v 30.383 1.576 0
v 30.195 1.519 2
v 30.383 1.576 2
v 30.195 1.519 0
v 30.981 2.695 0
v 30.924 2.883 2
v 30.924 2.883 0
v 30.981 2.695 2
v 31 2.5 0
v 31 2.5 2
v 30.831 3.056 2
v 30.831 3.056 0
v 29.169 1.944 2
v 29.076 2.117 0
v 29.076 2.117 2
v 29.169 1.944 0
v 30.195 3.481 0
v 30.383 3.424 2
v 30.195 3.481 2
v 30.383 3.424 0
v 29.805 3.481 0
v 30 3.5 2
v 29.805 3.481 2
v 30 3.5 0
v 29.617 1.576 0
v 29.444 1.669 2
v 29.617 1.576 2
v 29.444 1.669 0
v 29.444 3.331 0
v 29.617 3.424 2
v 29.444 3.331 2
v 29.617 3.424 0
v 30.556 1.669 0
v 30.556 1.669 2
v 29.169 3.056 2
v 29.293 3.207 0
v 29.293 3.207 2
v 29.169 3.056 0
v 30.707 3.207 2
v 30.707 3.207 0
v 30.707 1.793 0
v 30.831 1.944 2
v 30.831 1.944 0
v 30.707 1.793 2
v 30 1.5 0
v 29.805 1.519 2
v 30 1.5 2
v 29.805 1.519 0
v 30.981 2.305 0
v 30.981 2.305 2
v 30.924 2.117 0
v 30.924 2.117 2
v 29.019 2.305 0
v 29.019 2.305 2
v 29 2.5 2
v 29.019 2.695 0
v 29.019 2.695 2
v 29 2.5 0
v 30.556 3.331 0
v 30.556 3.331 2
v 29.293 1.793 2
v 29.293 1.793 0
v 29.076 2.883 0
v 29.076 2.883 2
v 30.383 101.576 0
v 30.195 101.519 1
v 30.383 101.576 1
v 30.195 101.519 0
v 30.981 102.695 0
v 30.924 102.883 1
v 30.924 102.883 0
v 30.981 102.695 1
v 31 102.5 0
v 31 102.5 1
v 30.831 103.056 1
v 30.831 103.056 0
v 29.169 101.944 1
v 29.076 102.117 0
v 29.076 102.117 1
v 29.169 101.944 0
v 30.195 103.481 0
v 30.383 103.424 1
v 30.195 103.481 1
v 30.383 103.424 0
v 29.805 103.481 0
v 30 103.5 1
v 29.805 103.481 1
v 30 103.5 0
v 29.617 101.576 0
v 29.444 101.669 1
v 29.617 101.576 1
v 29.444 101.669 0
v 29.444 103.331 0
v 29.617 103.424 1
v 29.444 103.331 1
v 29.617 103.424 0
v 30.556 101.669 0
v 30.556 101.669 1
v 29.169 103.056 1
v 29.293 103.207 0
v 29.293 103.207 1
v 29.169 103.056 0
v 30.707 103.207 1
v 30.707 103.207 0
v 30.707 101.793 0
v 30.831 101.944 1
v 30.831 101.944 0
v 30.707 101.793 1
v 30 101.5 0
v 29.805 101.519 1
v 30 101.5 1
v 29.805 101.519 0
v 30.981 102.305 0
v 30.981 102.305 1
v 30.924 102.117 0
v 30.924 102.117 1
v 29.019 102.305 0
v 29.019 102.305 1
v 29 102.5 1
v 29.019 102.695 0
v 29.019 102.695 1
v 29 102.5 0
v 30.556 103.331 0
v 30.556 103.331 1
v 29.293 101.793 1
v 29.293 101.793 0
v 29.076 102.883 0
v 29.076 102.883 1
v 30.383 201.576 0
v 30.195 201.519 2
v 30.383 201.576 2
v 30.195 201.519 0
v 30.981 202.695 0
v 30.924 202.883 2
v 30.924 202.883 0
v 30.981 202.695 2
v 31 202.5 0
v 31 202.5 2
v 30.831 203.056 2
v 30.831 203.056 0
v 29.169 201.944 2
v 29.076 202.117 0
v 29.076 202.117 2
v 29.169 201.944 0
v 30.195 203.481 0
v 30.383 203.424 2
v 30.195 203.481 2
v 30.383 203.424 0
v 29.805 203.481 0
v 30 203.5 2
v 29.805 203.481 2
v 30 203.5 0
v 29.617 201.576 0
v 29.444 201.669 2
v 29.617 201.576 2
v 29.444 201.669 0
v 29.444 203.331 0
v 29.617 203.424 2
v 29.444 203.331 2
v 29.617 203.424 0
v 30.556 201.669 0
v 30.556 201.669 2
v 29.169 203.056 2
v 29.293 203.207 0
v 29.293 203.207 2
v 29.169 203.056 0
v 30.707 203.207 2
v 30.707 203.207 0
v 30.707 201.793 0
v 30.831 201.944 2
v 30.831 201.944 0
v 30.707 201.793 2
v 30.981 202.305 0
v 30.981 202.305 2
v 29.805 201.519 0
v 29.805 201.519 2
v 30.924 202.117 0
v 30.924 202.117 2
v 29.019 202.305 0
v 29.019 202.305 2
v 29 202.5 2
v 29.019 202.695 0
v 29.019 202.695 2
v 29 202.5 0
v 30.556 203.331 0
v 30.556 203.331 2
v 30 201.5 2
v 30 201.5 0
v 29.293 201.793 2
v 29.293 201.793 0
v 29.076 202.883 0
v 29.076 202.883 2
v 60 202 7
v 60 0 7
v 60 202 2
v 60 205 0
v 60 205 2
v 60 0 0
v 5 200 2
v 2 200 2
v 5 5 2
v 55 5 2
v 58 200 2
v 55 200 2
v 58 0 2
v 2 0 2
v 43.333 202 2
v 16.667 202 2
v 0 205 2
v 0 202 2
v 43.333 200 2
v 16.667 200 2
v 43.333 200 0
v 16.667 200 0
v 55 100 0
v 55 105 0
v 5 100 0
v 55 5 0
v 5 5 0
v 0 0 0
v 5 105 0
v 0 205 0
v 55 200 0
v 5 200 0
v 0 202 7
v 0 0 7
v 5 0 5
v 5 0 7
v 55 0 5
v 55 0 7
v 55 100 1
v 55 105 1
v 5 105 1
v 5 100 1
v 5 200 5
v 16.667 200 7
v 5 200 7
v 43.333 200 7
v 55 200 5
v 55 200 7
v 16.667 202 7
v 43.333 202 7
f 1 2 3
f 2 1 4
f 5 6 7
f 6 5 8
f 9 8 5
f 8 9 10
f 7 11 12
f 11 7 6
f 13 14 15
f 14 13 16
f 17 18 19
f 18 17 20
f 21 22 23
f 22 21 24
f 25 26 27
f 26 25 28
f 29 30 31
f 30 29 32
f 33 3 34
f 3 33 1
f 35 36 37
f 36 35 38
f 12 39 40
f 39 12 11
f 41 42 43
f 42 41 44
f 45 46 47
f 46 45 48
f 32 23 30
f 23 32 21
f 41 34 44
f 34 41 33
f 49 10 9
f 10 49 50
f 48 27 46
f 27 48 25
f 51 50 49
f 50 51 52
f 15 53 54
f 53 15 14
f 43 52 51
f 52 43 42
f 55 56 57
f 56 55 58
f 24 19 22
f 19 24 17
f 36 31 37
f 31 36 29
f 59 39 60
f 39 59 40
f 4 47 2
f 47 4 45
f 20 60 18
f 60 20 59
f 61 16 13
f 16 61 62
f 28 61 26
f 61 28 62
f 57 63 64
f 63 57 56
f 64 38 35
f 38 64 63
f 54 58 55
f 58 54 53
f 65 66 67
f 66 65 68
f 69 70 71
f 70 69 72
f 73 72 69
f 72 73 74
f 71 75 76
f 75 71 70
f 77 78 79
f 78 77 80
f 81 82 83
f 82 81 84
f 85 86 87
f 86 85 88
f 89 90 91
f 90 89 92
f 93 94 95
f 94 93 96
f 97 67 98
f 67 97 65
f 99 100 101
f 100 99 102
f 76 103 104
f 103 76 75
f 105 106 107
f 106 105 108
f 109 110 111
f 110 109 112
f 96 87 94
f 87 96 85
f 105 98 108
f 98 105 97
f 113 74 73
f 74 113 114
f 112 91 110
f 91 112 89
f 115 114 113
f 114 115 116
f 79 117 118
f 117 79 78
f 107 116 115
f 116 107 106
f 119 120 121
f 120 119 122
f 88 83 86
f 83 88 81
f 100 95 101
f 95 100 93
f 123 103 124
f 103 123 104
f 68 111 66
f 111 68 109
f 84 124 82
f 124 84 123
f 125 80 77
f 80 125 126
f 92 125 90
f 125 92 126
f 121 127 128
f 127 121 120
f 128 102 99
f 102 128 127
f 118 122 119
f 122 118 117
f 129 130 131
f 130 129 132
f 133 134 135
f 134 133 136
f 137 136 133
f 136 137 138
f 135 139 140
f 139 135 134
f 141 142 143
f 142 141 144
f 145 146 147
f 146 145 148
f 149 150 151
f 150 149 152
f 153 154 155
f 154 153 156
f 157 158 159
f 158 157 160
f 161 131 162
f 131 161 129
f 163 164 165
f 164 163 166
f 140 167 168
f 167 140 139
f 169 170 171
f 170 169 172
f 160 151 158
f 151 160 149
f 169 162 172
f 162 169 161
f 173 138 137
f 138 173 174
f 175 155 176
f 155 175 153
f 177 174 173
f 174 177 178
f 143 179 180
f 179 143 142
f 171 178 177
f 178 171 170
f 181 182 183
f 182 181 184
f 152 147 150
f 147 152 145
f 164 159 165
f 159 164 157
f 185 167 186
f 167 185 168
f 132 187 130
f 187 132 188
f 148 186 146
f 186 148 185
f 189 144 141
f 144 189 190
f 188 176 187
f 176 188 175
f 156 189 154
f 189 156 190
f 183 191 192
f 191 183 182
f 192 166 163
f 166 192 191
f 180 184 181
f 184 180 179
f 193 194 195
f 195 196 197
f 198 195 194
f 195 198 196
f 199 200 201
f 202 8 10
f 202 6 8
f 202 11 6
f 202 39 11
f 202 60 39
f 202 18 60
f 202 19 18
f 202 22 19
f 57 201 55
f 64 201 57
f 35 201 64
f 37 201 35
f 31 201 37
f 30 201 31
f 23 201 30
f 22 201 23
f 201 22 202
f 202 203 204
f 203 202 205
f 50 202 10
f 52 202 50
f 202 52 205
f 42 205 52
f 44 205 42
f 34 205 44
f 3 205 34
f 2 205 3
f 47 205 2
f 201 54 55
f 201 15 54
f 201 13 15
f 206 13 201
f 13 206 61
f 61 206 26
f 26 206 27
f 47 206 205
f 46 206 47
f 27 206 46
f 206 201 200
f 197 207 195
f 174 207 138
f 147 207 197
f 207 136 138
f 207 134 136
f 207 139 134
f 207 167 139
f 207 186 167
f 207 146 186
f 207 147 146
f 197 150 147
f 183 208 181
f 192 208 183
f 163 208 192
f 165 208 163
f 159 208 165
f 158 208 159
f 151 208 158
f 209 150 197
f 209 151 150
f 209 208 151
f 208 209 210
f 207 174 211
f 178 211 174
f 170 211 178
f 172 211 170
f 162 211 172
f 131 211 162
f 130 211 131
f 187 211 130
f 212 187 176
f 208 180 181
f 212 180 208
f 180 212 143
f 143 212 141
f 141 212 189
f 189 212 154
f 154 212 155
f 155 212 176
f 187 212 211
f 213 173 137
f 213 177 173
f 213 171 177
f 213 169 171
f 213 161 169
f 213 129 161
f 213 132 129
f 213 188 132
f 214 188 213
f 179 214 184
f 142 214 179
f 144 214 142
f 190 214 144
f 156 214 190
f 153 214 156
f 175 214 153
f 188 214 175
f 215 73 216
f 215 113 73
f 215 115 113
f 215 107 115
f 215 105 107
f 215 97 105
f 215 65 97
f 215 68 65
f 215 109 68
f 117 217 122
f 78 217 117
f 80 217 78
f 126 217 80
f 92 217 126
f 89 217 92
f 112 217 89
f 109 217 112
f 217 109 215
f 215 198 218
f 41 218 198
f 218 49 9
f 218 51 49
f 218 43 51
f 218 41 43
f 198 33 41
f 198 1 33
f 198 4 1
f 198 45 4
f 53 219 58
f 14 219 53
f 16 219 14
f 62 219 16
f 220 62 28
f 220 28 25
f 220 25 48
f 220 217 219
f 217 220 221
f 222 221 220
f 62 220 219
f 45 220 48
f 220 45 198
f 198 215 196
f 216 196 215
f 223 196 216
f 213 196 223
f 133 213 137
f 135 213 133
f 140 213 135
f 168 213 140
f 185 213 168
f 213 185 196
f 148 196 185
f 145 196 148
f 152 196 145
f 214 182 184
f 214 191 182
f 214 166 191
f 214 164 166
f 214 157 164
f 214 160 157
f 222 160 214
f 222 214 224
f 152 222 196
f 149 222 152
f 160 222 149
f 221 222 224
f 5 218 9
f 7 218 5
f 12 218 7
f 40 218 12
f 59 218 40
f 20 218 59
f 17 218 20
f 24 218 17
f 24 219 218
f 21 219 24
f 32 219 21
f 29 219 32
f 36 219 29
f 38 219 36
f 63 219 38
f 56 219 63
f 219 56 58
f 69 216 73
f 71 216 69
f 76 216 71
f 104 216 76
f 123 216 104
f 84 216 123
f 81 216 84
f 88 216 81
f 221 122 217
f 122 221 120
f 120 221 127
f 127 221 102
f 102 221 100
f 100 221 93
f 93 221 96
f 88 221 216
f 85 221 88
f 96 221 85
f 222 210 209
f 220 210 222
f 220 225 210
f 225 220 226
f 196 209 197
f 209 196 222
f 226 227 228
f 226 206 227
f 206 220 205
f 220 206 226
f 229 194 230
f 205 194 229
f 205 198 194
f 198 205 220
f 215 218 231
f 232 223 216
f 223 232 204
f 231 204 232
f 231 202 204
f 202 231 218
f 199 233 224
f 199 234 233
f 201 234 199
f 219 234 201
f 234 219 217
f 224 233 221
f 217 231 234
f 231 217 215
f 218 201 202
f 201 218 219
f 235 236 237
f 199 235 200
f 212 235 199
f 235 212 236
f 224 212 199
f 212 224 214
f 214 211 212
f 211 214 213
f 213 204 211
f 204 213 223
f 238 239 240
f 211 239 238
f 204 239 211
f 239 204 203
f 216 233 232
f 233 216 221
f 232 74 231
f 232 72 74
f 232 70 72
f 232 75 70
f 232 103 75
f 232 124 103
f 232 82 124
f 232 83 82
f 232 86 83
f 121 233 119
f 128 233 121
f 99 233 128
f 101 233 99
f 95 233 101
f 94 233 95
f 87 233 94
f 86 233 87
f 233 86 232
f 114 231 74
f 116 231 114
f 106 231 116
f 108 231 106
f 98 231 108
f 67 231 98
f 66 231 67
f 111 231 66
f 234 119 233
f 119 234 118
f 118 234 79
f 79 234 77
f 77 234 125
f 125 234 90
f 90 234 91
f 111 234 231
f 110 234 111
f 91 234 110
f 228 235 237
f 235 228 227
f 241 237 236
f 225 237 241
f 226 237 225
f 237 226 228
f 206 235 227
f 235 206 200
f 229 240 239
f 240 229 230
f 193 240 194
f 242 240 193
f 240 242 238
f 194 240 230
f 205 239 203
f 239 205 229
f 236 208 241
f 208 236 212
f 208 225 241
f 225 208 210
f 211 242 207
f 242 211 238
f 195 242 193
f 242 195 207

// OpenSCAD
width = 50;
depth = 30;
length = 200;
thickness = 2; //In the rail and weight-bearing parts.
thickness_drawer = 0.8; //Of the drawer shell.
beam_width = 5;
screw_diameter = 3;
play = 1;
$fs = 0.2;
$fa = 1;

part = "rail"; //rail or drawer.

module railside() {
	translate([0, 0, thickness]) {
		difference() {
			cube([beam_width, length, thickness * 2 + play]);
			translate([beam_width, -0.1, thickness + play]) {
				rotate([0, 135, 0]) {
					cube([thickness * 3, length + 0.2, thickness * 3]);
				}
			}
		}
	}
}

if(part == "rail") {
	//Rail base.
	difference() {
		//Main shape is a cube with 2 big holes ("windows").
		cube([width + beam_width * 2, length + beam_width, thickness]);
		translate([beam_width, beam_width, -0.1]) {
			cube([width, length / 2 - beam_width, thickness + 0.2]);
		}
		translate([beam_width, length / 2 + beam_width, -0.1]) {
			cube([width, length / 2 - beam_width, thickness + 0.2]);
		}

		//Make the middle beam a bit lower for clearance for the drawer.
		translate([beam_width, length / 2 - 0.1, thickness / 2]) {
			cube([width, beam_width + 0.2, thickness / 2 + 0.1]);
		}

		//Screw holes.
		for(dy = [beam_width / 2 : (length / 2) : length + beam_width / 2]) {
			translate([beam_width + width / 2, dy, -0.1]) {
				cylinder(h=thickness + 0.2, r=screw_diameter / 3);
			}
		}
	}
	//Rails on the side.
	railside();
	translate([beam_width * 2 + width, 0, 0]) {
		mirror([1, 0, 0]) {
			railside();
		}
	}
	//Backstop!
	translate([0, length, 0]) {
		cube([width / 3, thickness, thickness * 3 + play]);
	}
	translate([beam_width * 2 + width * 2 / 3, length, 0]) {
		cube([width / 3, thickness, thickness * 3 + play]);
	}
} else {
	//Drawer.
	difference() {
		//Hooking into rails.
		cube([width + beam_width * 2 - thickness * 2 - play * 2, length, thickness]);
		translate([beam_width - thickness - play + thickness_drawer, -0.1, -0.1]) {
			cube([width - thickness_drawer * 2, length + 0.2, thickness + 0.2]);
		}
		translate([thickness, -0.1, thickness]) {
			rotate([0, -135, 0]) {
				cube([thickness * 2, length + 0.2, thickness * 2]);
			}
		}
		translate([width + beam_width * 2 - thickness * 3 - play * 2, -0.1, thickness]) {
			rotate([0, 45, 0]) {
				cube([thickness * 2, length + 0.2, thickness * 2]);
			}
		}
	}
	translate([beam_width - thickness - play, 0, 0]) {
		translate([width / 2, thickness_drawer, 0]) {
			//Cylindrical hollow insides.
			rotate([-90, 0, 0]) {
				scale([1, (depth - thickness_drawer) / (width / 2 - thickness_drawer), 1]) {
					difference() {
						translate([0, 0, -thickness_drawer]) {
							cylinder(h=length, r=width / 2);
						}
						cylinder(h=length - thickness_drawer * 2, r=width / 2 - thickness_drawer);
						translate([-width / 2 - 0.1, 0, -thickness_drawer - 0.1]) {
							cube([width + 0.2, depth + 0.1, length + 0.2]);
						}
					}
				}
			}
		}
	}
}
